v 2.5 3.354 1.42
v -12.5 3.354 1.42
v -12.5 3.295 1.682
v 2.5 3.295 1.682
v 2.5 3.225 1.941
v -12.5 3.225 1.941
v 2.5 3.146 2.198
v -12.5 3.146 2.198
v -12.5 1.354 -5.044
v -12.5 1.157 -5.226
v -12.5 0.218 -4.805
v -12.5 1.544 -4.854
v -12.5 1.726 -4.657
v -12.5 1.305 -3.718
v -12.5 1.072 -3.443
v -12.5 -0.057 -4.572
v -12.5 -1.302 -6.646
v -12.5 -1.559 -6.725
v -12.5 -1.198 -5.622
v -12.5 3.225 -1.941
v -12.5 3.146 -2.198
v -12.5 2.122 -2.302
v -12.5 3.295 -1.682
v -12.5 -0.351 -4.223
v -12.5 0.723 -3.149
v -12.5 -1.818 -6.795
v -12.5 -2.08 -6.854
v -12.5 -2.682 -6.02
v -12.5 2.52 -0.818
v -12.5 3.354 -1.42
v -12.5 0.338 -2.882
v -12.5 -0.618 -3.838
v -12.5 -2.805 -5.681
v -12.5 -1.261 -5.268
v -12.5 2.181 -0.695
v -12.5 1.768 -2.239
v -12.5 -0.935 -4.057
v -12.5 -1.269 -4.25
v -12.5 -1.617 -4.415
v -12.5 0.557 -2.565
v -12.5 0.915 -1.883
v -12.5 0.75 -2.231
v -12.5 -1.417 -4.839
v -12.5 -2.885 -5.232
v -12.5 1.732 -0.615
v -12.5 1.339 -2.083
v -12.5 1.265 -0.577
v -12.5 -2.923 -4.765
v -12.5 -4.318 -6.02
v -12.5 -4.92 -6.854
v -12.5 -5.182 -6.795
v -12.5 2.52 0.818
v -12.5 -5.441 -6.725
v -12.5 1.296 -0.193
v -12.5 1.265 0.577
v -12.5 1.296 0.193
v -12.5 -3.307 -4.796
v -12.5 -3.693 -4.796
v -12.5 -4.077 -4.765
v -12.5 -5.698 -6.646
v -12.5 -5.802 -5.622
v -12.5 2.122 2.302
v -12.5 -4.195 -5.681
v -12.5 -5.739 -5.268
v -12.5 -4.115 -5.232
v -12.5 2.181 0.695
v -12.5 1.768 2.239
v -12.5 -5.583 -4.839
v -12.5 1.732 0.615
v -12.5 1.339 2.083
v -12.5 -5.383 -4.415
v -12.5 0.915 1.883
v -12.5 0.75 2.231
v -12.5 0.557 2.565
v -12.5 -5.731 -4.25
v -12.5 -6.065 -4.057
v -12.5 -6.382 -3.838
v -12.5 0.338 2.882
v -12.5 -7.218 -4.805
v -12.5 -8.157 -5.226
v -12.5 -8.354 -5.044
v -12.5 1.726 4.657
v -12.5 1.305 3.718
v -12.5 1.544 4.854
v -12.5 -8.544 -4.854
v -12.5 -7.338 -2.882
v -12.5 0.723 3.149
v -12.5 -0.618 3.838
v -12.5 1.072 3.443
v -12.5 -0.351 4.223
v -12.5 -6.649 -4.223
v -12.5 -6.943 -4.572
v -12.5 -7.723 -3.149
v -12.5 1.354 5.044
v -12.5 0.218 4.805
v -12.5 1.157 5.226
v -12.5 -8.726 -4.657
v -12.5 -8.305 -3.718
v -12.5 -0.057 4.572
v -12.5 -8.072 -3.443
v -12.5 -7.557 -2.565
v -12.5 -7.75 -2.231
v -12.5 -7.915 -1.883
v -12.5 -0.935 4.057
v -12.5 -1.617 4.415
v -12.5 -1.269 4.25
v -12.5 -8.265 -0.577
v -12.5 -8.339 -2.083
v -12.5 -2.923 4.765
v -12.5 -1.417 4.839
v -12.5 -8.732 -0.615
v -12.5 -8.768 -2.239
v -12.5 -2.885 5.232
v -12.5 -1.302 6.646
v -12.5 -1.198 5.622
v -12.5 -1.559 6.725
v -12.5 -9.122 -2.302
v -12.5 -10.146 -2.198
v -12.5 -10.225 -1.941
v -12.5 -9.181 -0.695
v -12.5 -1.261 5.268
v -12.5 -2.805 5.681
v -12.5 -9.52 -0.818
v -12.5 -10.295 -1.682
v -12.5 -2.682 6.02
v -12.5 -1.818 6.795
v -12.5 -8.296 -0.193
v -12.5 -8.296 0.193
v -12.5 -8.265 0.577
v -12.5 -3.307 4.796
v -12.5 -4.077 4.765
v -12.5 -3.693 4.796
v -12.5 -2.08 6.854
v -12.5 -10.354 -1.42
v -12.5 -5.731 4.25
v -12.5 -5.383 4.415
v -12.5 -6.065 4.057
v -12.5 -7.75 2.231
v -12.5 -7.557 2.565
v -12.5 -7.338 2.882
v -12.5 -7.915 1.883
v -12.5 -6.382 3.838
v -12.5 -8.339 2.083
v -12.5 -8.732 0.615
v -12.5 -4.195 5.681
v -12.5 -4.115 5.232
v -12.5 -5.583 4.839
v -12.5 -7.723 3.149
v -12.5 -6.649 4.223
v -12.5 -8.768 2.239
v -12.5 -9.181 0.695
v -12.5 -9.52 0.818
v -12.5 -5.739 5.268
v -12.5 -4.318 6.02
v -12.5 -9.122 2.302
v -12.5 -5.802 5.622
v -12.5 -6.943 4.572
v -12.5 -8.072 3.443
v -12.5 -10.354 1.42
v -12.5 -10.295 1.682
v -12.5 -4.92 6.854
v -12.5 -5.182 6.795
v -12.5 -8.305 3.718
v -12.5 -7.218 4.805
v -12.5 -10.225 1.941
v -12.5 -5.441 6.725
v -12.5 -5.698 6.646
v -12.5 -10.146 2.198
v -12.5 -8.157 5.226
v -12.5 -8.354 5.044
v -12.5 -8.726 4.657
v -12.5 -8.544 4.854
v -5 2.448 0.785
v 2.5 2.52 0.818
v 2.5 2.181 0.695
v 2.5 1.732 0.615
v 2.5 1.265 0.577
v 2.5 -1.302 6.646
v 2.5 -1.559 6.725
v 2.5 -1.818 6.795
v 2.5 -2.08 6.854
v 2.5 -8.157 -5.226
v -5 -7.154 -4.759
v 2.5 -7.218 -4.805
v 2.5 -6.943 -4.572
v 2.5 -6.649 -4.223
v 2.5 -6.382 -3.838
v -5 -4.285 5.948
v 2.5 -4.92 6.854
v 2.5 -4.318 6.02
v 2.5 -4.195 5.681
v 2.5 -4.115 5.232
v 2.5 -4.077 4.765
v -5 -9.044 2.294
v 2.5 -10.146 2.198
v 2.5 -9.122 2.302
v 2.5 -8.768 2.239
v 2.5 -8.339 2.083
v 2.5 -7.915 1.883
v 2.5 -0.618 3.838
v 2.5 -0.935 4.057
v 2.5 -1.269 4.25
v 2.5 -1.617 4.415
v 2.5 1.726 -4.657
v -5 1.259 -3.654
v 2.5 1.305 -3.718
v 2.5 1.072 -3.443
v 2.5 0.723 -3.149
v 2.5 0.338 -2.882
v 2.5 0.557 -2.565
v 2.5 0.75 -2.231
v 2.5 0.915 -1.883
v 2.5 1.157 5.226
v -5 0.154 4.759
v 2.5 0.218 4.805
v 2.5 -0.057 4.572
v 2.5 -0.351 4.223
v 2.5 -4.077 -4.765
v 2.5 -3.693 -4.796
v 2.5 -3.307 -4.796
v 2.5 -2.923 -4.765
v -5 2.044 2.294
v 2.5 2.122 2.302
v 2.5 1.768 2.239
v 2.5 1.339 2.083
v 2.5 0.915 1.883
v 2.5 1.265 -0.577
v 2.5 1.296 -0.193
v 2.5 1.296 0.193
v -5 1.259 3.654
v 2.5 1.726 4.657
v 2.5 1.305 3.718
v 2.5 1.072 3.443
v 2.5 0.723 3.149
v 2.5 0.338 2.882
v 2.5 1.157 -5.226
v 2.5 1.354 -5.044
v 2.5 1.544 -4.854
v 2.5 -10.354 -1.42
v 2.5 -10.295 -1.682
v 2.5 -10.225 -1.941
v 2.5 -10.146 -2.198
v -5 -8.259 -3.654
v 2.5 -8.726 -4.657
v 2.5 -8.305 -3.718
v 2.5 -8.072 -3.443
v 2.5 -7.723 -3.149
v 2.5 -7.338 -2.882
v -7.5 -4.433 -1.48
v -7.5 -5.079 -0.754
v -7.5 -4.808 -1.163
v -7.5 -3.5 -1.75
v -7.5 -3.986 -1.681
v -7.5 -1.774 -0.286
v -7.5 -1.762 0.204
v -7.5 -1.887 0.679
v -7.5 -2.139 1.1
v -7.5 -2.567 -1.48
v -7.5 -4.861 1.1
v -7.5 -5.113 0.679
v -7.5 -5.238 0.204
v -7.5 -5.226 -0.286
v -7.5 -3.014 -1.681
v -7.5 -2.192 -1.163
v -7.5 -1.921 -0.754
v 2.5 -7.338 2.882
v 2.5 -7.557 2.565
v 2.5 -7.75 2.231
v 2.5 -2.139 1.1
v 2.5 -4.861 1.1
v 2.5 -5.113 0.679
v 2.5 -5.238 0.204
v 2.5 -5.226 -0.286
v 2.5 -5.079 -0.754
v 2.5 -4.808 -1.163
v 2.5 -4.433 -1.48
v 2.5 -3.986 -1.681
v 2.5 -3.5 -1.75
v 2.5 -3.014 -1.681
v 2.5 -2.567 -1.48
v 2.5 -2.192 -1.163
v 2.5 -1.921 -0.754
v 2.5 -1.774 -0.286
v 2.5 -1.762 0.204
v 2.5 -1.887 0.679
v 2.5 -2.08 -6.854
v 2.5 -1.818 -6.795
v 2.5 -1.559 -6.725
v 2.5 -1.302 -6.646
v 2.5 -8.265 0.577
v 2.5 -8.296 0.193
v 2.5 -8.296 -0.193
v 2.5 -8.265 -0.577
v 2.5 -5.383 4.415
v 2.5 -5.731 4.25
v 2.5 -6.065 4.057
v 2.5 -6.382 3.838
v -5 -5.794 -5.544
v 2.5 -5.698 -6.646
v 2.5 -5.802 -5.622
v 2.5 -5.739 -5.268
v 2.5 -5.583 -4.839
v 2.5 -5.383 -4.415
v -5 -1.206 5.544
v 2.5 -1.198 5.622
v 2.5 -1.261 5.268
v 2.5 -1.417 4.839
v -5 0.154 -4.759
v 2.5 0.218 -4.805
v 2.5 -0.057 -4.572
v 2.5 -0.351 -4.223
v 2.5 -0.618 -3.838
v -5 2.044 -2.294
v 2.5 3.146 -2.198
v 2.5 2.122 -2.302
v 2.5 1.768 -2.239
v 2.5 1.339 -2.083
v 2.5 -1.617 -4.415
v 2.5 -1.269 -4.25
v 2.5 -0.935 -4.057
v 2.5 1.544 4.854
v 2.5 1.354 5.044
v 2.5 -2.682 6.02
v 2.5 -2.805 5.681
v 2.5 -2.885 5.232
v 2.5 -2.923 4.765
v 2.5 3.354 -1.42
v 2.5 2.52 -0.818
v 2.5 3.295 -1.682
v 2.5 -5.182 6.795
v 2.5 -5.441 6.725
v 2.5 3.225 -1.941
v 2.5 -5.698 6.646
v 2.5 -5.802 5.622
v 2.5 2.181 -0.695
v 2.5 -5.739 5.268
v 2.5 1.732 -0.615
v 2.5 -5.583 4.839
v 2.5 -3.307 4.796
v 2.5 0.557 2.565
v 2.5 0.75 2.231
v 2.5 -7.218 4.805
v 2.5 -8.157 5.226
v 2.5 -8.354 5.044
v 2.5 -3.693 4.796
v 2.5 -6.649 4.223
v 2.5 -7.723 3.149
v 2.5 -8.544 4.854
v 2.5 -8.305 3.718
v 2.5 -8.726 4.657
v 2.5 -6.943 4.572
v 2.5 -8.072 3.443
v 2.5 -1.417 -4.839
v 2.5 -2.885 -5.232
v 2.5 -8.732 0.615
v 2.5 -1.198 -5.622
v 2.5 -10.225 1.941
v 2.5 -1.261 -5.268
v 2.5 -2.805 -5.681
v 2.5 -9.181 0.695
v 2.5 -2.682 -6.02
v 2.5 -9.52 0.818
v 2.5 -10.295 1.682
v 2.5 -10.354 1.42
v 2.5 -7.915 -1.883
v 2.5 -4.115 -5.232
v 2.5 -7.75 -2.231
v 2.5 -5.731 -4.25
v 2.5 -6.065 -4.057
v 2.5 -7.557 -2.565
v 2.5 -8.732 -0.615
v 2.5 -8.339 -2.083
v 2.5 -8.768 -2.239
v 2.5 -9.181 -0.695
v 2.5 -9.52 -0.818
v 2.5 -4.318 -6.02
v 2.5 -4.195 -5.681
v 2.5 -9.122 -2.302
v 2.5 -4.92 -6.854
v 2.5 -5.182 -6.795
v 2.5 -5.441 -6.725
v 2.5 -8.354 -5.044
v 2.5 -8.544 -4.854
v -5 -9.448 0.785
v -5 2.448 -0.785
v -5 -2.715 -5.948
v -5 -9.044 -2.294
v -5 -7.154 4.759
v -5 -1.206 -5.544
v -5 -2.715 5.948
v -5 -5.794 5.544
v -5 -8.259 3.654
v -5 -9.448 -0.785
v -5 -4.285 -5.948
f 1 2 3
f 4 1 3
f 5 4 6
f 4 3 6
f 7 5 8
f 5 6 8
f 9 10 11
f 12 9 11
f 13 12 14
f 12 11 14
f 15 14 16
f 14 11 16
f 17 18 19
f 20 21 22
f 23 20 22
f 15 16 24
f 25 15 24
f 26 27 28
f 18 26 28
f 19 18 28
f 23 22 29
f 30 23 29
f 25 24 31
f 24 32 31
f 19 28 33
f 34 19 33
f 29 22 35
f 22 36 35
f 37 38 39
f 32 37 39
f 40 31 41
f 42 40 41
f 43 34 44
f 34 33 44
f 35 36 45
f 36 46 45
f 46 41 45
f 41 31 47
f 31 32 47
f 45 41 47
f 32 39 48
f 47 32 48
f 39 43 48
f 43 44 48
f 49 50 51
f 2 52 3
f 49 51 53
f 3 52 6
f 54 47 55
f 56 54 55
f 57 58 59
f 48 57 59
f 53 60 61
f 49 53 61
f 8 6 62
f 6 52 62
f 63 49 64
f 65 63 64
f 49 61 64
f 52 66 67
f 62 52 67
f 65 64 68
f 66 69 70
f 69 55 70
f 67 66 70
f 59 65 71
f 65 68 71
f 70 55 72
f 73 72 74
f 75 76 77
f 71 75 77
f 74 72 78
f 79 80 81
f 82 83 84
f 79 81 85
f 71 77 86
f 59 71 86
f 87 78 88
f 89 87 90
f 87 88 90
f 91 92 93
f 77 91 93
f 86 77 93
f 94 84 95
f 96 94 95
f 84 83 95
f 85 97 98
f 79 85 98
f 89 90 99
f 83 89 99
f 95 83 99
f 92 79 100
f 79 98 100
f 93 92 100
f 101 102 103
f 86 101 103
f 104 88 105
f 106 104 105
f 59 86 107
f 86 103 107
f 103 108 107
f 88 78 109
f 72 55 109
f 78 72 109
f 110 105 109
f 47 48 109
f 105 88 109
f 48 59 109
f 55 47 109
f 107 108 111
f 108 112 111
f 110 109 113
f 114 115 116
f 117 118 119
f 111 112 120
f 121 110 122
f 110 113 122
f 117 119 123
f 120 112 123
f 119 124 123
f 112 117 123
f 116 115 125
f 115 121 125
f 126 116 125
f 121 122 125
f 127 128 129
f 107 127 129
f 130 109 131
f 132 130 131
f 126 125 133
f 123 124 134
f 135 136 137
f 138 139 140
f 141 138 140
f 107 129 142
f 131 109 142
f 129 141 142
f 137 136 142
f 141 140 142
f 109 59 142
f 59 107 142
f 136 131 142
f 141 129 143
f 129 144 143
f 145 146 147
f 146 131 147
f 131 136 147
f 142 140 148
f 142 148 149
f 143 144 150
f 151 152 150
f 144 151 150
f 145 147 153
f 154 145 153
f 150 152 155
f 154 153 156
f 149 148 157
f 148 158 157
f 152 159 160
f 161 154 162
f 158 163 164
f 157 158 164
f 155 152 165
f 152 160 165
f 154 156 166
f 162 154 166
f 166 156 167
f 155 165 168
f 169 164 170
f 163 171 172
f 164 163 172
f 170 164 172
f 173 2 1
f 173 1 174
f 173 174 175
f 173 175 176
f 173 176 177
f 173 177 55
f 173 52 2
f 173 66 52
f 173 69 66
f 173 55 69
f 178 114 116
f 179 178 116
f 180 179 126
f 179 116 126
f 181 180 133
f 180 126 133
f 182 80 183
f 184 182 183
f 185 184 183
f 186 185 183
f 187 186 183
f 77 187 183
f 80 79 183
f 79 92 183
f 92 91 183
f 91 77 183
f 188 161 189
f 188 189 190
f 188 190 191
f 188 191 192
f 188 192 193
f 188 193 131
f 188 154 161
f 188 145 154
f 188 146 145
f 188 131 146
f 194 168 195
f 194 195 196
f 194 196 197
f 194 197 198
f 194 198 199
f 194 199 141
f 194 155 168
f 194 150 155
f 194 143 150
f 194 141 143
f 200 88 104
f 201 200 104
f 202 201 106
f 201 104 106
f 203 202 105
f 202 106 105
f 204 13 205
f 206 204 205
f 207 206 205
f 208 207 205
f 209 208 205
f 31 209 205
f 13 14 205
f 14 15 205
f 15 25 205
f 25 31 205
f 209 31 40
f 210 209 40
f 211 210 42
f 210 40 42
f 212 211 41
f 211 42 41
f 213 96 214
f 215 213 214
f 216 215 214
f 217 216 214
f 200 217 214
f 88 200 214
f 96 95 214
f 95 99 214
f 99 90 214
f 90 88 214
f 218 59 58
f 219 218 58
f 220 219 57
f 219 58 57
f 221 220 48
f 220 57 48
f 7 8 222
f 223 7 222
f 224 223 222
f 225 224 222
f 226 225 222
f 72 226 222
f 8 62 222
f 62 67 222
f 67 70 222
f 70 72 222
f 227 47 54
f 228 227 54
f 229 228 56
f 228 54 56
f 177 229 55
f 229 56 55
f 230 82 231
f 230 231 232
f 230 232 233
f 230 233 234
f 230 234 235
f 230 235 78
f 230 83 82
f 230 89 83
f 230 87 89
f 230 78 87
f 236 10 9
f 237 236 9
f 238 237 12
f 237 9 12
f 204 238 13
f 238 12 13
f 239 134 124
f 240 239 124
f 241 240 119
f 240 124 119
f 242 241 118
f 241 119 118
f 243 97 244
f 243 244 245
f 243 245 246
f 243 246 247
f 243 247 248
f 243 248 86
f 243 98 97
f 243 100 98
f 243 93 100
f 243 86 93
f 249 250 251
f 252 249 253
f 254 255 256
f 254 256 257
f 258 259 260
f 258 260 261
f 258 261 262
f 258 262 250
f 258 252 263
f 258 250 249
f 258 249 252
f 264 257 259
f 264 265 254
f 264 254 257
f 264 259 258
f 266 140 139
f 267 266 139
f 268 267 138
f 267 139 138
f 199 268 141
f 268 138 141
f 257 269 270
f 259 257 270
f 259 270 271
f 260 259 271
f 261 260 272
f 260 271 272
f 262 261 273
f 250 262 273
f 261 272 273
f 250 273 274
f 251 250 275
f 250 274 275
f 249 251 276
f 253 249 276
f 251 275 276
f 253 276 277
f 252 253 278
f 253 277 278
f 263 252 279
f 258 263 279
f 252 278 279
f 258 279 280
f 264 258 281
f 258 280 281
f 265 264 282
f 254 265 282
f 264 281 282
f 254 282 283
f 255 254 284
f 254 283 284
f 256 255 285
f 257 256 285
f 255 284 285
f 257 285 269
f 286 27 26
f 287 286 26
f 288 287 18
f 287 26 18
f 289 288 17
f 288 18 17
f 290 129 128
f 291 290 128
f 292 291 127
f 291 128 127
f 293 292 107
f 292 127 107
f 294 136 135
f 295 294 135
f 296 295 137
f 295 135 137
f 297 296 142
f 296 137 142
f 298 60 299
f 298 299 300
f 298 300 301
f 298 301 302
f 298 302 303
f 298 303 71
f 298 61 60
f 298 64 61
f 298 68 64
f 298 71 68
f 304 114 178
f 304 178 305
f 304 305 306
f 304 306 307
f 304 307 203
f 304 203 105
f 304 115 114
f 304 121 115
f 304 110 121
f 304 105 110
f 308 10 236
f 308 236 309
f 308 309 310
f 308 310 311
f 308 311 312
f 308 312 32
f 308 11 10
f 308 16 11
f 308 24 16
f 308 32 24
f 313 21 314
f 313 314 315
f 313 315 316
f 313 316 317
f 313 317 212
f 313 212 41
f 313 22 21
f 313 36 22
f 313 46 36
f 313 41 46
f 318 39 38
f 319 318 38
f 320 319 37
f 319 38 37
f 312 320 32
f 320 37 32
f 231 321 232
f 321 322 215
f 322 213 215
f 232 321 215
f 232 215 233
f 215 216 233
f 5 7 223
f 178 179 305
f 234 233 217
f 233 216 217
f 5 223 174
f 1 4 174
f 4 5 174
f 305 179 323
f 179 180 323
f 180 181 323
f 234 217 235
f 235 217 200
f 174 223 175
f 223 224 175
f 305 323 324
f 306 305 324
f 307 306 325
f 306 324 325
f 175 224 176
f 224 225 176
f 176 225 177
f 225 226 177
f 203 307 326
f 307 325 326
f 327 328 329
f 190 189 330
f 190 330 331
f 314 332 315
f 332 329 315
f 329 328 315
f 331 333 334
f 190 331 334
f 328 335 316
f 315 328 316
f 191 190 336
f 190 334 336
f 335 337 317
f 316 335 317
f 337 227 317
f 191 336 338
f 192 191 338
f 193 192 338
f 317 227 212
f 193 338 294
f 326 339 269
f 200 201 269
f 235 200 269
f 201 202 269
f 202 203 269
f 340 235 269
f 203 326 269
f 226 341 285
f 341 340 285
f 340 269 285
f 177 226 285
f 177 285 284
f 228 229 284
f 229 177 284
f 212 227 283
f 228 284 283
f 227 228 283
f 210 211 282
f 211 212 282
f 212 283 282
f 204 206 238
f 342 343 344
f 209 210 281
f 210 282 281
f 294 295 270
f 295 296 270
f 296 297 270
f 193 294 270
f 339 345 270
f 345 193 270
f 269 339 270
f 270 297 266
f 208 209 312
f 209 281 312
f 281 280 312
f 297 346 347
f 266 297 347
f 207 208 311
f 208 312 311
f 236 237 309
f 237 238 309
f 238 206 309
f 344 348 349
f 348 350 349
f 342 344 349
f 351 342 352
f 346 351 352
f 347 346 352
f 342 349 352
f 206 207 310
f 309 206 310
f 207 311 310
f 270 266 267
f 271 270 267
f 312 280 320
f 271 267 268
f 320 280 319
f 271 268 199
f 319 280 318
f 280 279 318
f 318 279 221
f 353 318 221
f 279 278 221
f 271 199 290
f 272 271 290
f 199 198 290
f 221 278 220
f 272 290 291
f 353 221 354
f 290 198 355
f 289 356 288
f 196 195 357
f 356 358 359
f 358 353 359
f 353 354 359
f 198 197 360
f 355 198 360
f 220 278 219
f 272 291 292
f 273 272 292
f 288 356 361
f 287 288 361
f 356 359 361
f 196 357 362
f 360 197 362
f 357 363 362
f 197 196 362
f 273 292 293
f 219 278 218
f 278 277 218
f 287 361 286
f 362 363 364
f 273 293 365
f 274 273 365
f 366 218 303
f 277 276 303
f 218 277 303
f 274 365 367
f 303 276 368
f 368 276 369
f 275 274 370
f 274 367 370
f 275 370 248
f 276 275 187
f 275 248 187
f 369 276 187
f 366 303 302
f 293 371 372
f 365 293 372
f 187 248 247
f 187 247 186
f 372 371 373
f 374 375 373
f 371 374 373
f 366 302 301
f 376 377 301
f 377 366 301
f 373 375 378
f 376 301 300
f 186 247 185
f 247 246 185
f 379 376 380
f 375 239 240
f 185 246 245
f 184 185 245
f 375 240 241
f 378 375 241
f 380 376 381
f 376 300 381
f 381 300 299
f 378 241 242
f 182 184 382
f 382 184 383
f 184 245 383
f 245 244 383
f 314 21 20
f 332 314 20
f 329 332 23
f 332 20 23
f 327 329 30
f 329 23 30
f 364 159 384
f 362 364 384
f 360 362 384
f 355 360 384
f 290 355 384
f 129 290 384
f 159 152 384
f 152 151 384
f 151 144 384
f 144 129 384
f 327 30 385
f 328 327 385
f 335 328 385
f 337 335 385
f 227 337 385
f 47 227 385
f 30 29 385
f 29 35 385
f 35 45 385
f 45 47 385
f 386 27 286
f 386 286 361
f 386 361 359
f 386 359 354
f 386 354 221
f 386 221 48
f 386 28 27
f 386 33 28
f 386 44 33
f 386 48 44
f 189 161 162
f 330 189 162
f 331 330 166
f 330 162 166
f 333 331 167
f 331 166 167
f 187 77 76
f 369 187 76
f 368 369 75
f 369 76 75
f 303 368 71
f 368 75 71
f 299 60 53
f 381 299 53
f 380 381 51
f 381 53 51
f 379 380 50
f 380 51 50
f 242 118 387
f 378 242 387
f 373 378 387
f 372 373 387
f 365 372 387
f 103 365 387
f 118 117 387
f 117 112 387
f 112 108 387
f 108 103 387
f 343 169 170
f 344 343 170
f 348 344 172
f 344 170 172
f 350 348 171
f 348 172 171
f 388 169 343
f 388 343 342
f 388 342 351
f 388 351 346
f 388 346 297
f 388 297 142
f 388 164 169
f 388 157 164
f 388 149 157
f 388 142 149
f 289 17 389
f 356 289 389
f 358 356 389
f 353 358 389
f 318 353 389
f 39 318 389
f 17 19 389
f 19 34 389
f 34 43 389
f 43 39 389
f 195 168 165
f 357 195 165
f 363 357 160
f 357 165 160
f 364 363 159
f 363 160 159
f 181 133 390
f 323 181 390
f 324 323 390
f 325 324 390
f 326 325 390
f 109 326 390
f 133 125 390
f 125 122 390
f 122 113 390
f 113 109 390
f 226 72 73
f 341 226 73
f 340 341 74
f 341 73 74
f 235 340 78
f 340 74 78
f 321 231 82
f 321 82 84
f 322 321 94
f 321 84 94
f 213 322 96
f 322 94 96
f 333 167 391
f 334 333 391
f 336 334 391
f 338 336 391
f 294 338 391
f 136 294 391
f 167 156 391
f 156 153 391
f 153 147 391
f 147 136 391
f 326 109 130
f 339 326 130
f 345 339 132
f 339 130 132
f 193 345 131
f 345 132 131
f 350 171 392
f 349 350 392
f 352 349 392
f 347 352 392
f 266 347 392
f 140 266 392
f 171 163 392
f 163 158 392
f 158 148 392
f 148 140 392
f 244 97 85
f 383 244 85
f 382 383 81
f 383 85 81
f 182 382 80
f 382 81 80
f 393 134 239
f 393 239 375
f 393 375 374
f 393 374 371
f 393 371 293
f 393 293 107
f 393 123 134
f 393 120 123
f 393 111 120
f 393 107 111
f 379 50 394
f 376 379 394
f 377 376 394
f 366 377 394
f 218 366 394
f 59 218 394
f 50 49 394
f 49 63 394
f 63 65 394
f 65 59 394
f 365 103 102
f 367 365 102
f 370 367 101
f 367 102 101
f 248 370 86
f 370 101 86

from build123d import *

# Parameters (mm, degrees)
KUGGLUCKA_DEPTH    = 15
CIRPATTERN_COUNT   = 12
CUT_EXTRUDE1_START = -10
SKETCH1_R          = 4.5
CUT_EXTRUDE1_DEPTH = 10
CUT_EXTRUDE2_DEPTH = 10


with BuildPart() as part:
    # Ritning 1 → Kugghjulsämne (revolve)
    with BuildSketch(Plane.XY, mode=Mode.PRIVATE) as kugghjuls_mne_sk:
        Polygon((12.5, 1), (2.5, 1), (2.5, 3.5), (-12.5, 3.5), (-12.5, -3.5), (12.5, -3.5), align=None)
    revolve(kugghjuls_mne_sk.sketch.rotate(Axis((-12.5, -3.5, 0), (1, 0, 0)), 90), axis=Axis((-12.5, -3.5, 0), (1, 0, 0)))

    # Ritning 2 → Kugglucka (cut)
    with BuildSketch(Plane.ZY.offset(12.5)):
        with BuildLine():
            Line((1.419865071, 3.354486354), (0, 4.774351425))
            Line((0, 4.774351425), (-1.419865071, 3.354486354))
            add(Edge.make_bspline(
                [(-1.419865071, 3.354486354), (-1.173032372, 3.067088657), (-0.658113481, 2.467546927), (-0.604624671, 1.6768746), (-0.576776379, 1.265220772)],
                knots=[0, 0, 0, 0, 0.479362292, 1, 1, 1, 1], degree=3))
            ThreePointArc((-0.576776379, 1.265220772), (0, 1.3), (0.576776379, 1.265220772))
            add(Edge.make_bspline(
                [(1.419865071, 3.354486354), (1.173032372, 3.067088657), (0.658113481, 2.467546927), (0.604624671, 1.6768746), (0.576776379, 1.265220772)],
                knots=[0, 0, 0, 0, 0.479362292, 1, 1, 1, 1], degree=3))
        make_face()
    kugglucka = extrude(amount=-KUGGLUCKA_DEPTH, mode=Mode.SUBTRACT)

    # CirPattern: Kugglucka ×12 about axis
    cirpattern_axis = Axis((-12.5, -3.5, 0), (-1, 0, 0))
    for i in range(1, CIRPATTERN_COUNT):
        add(kugglucka.rotate(cirpattern_axis, i * 360 / CIRPATTERN_COUNT), mode=Mode.SUBTRACT)

    # Sketch1 → Cut-Extrude1 (cut)
    with BuildSketch(Plane(origin=(12.5, 0, 0), x_dir=(0, 0, -1), z_dir=(1, 0, 0)).offset(CUT_EXTRUDE1_START)):
        with Locations((0, -3.5)):
            Circle(SKETCH1_R)
    extrude(amount=CUT_EXTRUDE1_DEPTH, mode=Mode.SUBTRACT)

    # Sketch2 → Cut-Extrude2 (cut)
    with BuildSketch(Plane(origin=(2.5, 0, 0), x_dir=(0, 0, -1), z_dir=(1, 0, 0))):
        with BuildLine():
            Line((-1.1, -2.138934241), (-1.1, -4.861065759))
            ThreePointArc((-1.1, -4.861065759), (1.75, -3.5), (-1.1, -2.138934241))
        make_face()
    extrude(amount=-CUT_EXTRUDE2_DEPTH, mode=Mode.SUBTRACT)


solid = part.part
